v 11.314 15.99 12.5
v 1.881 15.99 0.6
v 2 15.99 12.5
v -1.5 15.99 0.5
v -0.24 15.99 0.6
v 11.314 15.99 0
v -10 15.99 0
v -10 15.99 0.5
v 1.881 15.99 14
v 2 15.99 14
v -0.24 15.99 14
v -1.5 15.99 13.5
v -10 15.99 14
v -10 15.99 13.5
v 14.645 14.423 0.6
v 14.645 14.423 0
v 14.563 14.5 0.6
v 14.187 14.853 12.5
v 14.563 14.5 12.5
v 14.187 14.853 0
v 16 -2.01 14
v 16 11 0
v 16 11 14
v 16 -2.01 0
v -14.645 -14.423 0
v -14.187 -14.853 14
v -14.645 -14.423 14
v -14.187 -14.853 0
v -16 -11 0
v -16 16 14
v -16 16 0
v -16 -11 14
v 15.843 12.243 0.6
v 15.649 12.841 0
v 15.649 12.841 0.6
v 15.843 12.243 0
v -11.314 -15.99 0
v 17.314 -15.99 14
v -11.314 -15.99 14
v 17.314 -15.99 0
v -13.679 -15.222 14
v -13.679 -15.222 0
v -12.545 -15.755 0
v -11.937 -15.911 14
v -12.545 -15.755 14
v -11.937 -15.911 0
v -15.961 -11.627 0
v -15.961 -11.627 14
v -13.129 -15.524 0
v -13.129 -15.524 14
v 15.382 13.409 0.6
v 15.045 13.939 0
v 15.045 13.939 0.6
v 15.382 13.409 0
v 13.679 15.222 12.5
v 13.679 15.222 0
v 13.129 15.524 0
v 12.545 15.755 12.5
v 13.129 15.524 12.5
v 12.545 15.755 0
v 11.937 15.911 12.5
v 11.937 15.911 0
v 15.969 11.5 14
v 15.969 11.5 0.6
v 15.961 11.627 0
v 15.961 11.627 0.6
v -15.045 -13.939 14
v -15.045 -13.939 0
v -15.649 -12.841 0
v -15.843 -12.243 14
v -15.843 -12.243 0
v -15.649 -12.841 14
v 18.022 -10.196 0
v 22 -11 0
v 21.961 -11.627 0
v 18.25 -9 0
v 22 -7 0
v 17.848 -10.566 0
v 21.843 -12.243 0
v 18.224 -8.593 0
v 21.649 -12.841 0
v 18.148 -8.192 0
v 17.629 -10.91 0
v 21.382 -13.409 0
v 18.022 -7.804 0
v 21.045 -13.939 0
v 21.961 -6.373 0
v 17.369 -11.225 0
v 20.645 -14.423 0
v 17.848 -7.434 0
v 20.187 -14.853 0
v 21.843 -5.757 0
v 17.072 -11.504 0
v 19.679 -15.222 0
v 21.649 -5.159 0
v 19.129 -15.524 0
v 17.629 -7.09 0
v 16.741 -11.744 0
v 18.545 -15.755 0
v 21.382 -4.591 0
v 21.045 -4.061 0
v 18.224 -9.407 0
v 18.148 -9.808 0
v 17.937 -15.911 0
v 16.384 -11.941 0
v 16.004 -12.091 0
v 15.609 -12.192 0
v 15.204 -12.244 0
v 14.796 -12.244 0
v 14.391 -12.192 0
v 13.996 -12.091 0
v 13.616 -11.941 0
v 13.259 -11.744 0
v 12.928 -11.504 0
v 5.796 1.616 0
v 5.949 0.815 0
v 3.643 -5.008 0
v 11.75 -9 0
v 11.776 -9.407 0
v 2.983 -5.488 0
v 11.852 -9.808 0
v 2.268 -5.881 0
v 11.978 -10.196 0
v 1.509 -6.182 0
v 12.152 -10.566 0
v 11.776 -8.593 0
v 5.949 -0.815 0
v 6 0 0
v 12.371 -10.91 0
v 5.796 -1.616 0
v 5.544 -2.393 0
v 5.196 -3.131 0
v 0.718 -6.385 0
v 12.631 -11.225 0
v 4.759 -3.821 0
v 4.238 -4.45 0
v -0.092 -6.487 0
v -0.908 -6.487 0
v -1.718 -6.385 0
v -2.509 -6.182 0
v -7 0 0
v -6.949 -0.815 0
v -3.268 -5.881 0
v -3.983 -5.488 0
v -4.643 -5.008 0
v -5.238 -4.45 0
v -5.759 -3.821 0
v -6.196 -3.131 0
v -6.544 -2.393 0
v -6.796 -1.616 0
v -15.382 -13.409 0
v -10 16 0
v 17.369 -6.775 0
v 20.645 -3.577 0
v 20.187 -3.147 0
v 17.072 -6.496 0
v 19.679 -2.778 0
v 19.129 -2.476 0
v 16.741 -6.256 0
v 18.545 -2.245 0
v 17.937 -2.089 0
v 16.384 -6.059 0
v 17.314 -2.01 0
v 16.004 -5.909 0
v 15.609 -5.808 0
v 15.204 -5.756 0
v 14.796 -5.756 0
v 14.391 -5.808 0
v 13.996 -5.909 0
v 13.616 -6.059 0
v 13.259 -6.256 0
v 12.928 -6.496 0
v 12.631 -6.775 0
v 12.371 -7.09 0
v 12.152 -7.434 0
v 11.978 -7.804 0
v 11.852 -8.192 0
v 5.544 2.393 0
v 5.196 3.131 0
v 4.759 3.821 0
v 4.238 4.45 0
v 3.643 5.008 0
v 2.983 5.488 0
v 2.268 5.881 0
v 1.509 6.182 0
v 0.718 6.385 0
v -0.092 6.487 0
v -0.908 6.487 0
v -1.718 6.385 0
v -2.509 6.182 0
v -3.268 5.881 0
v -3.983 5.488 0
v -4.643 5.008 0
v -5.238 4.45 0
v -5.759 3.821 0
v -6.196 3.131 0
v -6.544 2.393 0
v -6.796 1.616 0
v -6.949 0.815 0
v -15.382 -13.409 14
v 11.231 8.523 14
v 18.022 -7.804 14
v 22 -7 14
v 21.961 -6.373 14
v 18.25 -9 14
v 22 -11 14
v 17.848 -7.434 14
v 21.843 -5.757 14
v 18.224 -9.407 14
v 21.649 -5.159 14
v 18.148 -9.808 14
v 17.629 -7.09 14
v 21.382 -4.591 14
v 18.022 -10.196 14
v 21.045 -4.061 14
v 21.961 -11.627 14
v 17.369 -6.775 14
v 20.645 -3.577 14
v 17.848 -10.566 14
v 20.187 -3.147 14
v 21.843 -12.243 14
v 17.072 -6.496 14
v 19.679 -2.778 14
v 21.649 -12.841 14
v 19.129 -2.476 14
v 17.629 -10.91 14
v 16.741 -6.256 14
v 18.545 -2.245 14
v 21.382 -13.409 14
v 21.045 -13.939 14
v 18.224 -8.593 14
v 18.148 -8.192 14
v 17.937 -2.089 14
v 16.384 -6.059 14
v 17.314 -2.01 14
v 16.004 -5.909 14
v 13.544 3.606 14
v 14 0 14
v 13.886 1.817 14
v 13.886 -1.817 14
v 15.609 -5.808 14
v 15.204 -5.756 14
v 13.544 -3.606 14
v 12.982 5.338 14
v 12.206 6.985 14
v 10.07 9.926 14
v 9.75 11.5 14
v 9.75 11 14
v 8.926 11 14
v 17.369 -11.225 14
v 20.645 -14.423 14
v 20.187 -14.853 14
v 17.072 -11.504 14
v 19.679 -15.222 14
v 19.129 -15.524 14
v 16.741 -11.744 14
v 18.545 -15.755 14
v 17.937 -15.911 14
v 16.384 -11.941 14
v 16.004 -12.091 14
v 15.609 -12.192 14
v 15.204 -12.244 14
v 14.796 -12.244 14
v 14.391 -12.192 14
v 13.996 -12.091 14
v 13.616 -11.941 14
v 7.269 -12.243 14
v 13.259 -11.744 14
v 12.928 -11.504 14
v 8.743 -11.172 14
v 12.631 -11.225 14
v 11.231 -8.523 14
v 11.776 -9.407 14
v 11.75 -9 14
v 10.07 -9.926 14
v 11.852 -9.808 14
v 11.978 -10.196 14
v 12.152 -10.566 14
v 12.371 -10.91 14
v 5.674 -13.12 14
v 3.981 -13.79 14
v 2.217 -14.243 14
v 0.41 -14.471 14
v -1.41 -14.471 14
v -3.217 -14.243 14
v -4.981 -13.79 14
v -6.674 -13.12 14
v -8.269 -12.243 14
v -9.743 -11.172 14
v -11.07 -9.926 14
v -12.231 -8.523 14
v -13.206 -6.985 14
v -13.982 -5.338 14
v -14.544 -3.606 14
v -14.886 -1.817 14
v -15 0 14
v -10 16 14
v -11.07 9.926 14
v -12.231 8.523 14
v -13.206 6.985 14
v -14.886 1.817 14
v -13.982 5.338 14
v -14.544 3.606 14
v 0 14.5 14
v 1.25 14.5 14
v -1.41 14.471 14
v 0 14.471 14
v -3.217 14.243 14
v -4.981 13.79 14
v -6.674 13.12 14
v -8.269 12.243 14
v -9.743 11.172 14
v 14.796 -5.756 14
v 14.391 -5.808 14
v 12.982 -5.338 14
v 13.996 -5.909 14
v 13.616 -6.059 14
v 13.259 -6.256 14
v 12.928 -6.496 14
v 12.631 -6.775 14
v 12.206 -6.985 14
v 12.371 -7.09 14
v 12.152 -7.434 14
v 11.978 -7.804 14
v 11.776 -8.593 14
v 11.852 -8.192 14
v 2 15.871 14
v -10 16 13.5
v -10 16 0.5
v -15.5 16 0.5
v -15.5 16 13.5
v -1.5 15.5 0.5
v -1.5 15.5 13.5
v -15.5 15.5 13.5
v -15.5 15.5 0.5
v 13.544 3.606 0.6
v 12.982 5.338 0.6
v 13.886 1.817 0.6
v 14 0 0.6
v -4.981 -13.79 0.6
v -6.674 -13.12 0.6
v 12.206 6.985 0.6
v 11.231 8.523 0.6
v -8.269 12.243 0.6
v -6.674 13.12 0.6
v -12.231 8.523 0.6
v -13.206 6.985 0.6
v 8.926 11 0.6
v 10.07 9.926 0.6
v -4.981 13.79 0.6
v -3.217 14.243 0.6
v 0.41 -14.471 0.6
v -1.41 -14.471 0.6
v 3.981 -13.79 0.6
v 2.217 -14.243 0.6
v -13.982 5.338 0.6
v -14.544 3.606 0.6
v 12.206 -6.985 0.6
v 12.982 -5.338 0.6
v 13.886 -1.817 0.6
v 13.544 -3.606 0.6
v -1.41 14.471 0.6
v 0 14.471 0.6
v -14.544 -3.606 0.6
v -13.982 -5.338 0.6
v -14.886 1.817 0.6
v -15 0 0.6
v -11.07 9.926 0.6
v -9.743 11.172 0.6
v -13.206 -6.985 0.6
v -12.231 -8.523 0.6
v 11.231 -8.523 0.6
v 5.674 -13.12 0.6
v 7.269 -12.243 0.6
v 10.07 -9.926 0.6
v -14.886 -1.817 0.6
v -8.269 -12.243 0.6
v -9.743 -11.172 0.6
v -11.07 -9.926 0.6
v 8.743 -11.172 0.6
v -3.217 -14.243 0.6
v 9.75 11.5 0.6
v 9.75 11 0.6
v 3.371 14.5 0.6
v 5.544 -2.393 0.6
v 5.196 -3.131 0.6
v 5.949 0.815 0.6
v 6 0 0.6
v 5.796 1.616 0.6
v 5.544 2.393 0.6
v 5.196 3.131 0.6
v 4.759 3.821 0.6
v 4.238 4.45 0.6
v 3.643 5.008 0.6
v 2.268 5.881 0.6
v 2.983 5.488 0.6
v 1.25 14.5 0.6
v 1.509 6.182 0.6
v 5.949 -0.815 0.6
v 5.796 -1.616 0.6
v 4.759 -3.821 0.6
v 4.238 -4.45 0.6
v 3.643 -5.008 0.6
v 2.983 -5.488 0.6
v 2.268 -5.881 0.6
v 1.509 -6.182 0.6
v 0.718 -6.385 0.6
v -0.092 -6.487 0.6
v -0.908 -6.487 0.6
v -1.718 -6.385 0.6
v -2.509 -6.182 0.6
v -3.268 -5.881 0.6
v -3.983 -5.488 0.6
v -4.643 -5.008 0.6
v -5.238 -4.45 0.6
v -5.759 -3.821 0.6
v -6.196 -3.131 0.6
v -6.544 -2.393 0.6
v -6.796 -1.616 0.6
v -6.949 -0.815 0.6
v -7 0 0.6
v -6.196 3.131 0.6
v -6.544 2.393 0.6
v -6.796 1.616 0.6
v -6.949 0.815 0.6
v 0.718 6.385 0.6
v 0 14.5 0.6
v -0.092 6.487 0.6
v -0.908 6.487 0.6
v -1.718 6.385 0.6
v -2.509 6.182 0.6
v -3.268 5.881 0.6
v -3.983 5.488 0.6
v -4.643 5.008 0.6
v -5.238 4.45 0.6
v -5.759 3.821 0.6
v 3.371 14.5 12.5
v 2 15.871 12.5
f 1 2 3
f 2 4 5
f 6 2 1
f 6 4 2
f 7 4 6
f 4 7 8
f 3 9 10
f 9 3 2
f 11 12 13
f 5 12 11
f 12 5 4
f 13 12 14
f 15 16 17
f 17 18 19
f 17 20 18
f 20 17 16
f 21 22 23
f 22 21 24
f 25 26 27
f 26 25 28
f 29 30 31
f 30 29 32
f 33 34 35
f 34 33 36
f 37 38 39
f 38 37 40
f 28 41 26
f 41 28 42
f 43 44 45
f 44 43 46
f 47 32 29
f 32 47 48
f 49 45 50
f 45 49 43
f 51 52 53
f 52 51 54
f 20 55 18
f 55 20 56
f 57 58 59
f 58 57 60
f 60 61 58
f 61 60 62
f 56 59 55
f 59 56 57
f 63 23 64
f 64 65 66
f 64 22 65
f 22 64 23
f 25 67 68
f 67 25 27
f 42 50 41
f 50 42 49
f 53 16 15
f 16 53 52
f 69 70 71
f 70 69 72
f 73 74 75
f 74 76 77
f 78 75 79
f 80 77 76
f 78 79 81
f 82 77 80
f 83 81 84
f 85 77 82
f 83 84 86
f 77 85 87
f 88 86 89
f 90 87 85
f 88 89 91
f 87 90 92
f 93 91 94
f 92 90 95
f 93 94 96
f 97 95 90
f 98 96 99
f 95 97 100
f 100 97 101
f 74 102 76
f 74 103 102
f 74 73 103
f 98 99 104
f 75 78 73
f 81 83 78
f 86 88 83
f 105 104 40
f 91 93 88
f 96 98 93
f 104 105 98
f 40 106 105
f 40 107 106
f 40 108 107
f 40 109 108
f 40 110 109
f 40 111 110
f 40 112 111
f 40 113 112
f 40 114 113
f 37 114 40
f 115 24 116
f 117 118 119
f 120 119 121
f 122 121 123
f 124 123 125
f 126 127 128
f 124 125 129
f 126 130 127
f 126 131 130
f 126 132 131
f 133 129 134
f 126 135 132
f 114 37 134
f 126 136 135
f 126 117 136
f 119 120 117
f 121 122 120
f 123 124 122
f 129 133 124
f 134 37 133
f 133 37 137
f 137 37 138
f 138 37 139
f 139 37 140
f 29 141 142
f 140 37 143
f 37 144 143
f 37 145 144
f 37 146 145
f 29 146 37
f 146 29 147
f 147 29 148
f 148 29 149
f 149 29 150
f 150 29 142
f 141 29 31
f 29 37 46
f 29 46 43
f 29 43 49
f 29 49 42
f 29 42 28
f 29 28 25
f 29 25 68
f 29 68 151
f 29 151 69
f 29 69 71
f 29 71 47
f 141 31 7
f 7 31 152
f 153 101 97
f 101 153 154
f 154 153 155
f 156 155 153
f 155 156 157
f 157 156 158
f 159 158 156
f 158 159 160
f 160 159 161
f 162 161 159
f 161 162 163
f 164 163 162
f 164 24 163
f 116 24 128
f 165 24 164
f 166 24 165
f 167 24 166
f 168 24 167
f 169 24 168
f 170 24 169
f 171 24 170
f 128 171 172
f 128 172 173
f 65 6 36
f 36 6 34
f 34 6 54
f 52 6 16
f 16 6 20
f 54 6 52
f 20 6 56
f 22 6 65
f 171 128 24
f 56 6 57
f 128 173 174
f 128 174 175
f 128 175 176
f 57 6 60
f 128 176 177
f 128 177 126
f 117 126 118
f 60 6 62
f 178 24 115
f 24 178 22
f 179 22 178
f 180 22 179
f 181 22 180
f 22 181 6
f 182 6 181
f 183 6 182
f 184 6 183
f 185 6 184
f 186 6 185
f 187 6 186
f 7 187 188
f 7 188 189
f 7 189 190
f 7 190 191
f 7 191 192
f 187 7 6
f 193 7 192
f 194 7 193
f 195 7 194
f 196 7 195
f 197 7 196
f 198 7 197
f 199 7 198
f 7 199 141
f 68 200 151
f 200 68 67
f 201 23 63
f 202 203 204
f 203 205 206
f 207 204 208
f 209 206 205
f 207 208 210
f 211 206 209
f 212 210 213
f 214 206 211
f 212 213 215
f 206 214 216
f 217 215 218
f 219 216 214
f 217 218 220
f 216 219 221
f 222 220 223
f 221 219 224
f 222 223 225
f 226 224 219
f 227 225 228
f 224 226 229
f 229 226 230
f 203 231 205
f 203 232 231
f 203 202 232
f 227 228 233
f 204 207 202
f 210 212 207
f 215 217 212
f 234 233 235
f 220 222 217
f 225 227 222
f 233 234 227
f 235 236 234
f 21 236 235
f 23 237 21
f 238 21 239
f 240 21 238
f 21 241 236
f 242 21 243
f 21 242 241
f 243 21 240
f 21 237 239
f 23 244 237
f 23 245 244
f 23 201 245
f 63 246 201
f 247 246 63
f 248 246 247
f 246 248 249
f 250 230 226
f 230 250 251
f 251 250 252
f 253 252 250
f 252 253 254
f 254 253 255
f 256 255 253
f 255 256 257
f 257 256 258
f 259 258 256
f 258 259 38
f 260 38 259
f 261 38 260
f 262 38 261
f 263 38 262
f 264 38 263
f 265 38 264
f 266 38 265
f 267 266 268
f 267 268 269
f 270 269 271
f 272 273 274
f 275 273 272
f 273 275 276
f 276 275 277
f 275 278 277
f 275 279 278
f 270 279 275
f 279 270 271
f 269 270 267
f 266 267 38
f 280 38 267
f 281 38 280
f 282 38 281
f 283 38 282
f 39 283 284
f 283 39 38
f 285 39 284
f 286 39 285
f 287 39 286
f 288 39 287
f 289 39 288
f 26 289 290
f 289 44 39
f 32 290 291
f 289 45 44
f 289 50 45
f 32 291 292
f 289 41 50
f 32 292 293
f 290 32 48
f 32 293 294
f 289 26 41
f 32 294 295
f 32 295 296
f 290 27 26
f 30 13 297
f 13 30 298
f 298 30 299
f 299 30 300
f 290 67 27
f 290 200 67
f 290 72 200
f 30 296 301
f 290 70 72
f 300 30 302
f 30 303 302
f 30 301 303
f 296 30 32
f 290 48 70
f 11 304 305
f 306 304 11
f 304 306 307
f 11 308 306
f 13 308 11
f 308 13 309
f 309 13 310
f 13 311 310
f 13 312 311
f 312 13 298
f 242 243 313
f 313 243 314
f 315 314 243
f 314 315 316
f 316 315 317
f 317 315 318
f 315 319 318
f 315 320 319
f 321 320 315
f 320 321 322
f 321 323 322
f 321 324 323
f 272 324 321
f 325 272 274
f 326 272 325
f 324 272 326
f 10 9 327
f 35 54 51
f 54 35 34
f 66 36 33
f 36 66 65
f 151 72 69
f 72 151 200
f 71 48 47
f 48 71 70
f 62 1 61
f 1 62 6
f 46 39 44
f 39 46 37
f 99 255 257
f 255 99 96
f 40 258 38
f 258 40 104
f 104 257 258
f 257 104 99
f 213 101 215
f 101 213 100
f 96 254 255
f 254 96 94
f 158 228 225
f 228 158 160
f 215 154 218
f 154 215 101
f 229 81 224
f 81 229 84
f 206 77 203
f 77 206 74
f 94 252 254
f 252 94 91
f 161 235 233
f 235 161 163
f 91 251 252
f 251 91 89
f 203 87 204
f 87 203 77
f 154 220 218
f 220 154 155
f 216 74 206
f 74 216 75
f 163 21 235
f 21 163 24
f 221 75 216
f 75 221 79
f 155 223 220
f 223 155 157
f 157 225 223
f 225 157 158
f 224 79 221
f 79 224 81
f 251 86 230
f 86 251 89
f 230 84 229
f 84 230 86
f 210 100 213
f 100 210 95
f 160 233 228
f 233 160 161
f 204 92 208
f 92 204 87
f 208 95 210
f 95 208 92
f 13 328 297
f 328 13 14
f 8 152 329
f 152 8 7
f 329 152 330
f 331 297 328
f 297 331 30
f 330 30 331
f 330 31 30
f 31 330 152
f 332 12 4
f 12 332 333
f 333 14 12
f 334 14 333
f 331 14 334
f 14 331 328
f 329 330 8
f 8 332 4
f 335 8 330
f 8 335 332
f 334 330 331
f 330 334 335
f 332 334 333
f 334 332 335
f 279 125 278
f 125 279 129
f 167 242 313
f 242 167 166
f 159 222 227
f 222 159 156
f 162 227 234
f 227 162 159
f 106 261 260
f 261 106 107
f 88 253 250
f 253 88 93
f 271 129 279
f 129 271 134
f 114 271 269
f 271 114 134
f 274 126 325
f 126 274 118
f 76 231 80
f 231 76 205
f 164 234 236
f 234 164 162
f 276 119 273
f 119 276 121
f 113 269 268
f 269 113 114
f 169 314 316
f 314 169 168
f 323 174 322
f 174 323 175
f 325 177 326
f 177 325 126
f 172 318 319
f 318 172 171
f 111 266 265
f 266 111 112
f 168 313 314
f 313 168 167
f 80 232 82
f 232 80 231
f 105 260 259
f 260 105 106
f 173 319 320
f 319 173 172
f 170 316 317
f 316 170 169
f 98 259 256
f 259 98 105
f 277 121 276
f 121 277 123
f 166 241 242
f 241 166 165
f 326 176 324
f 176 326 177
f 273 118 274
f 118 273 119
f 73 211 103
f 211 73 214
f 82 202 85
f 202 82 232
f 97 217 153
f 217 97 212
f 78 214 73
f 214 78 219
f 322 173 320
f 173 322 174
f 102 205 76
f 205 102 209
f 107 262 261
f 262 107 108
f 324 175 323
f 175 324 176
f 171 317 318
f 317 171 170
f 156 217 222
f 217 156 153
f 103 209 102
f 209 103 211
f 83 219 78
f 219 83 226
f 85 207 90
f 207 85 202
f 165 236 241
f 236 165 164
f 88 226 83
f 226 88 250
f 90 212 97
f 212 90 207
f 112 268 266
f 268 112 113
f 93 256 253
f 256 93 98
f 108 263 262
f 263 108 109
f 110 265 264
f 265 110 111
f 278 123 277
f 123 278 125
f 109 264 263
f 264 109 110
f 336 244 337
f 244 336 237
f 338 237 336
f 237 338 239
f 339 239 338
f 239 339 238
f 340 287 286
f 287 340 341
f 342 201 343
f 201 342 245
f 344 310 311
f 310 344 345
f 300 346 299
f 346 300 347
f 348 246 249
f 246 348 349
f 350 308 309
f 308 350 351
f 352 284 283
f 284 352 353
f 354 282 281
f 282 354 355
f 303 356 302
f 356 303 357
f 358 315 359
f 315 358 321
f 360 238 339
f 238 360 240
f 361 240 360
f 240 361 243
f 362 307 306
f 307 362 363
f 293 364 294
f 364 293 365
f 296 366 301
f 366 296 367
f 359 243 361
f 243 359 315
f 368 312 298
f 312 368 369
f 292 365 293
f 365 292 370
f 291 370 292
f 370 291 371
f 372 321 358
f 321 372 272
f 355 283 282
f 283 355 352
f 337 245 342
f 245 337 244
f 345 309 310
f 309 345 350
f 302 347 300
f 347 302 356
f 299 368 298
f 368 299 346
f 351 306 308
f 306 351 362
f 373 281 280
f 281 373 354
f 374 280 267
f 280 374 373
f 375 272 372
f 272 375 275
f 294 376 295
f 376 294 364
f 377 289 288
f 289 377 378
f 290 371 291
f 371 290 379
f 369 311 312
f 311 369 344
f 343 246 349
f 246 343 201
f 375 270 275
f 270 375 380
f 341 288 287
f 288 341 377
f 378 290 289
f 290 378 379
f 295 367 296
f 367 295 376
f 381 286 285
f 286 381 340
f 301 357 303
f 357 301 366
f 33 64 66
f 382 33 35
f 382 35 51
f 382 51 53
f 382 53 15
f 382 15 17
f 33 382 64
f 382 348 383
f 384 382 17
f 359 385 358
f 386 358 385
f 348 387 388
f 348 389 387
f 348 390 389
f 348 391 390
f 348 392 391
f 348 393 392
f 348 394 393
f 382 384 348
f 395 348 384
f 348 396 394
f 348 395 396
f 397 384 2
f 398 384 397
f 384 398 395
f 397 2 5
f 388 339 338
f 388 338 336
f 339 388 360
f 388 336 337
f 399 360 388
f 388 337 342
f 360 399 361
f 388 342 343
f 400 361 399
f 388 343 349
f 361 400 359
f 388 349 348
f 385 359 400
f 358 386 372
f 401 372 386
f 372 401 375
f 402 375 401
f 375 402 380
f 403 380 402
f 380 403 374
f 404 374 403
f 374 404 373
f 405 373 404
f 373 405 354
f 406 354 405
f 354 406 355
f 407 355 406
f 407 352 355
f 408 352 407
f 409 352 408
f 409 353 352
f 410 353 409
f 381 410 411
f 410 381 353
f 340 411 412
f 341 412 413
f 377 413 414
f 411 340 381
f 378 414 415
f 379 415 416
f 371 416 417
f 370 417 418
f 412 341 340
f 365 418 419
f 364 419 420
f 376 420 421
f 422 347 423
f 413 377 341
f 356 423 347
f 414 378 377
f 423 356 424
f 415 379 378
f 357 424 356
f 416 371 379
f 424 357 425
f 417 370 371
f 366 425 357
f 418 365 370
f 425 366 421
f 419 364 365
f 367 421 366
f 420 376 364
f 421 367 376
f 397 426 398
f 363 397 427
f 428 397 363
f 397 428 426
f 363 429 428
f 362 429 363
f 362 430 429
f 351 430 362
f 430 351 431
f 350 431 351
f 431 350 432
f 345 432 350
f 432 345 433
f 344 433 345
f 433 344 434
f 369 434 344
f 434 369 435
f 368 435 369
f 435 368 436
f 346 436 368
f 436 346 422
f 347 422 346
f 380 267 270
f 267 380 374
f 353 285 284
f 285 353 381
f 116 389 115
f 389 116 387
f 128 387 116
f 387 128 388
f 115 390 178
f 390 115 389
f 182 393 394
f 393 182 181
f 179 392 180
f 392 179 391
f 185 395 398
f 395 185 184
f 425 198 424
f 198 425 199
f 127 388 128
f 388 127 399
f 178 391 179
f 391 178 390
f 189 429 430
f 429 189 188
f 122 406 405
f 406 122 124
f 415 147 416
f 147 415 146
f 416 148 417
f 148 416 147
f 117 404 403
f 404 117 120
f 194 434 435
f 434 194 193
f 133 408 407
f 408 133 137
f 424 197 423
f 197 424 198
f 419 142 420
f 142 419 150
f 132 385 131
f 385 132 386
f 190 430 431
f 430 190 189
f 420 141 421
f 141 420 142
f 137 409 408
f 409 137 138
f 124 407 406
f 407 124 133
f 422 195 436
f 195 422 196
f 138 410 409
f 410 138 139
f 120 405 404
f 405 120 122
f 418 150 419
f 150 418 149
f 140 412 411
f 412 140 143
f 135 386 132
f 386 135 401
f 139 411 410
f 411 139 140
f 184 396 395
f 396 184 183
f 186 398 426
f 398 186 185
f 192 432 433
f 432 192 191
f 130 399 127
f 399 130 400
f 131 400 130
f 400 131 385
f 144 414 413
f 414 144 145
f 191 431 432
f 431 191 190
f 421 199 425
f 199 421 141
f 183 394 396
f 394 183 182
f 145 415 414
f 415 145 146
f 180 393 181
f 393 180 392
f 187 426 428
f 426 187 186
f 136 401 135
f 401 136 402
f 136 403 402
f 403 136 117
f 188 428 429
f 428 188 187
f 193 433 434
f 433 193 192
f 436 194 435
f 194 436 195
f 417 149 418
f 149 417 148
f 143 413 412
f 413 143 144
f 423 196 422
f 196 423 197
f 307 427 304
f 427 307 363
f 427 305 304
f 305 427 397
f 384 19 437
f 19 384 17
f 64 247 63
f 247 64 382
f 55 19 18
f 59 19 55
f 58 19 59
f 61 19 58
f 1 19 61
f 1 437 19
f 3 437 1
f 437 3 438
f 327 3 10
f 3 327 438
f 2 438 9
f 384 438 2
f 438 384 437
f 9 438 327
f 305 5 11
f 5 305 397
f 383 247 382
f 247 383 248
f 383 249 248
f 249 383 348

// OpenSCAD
$fn = 50;


difference() {
	union() {
		hull() {
			translate(v = [-11.0000000000, 11.0000000000, 0]) {
				cylinder(h = 14, r = 5);
			}
			translate(v = [11.0000000000, 11.0000000000, 0]) {
				cylinder(h = 14, r = 5);
			}
			translate(v = [-11.0000000000, -11.0000000000, 0]) {
				cylinder(h = 14, r = 5);
			}
			translate(v = [11.0000000000, -11.0000000000, 0]) {
				cylinder(h = 14, r = 5);
			}
		}
		translate(v = [7.5000000000, -9.0000000000, 0]) {
			hull() {
				translate(v = [-9.5000000000, 2.0000000000, 0]) {
					cylinder(h = 14, r = 5);
				}
				translate(v = [9.5000000000, 2.0000000000, 0]) {
					cylinder(h = 14, r = 5);
				}
				translate(v = [-9.5000000000, -2.0000000000, 0]) {
					cylinder(h = 14, r = 5);
				}
				translate(v = [9.5000000000, -2.0000000000, 0]) {
					cylinder(h = 14, r = 5);
				}
			}
		}
		translate(v = [-16.0000000000, 10.0000000000, 0]) {
			cube(size = [6, 6, 14]);
		}
	}
	union() {
		translate(v = [-15.5000000000, 15.5000000000, 0.5000000000]) {
			cube(size = [14, 0.5000000000, 13.0000000000]);
		}
		translate(v = [15.0000000000, -9.0000000000, -50.0000000000]) {
			cylinder(h = 100, r = 3.2500000000);
		}
		translate(v = [-0.5000000000, 0.0000000000, 0.6000000000]) {
			cylinder(h = 16.4000000000, r = 14.5000000000);
		}
		translate(v = [-0.5000000000, 0.0000000000, -7.0000000000]) {
			cylinder(h = 14, r = 6.5000000000);
		}
		translate(v = [0.0000000000, 11.5000000000, 0.6000000000]) {
			cube(size = [16.0000000000, 3, 16.4000000000]);
		}
		translate(v = [2.0000000000, 11.5000000000, 12.5000000000]) {
			cube(size = [14.0000000000, 6, 1.5000000000]);
		}
		translate(v = [-3.0000000000, 18.7500000000, 0.6000000000]) {
			rotate(a = [0, 0, -45]) {
				cube(size = [10, 1.5000000000, 16.4000000000]);
			}
		}
		translate(v = [2.2500000000, 11.0000000000, 0.6000000000]) {
			cube(size = [7.5000000000, 2, 13.4000000000]);
		}
	}
}
